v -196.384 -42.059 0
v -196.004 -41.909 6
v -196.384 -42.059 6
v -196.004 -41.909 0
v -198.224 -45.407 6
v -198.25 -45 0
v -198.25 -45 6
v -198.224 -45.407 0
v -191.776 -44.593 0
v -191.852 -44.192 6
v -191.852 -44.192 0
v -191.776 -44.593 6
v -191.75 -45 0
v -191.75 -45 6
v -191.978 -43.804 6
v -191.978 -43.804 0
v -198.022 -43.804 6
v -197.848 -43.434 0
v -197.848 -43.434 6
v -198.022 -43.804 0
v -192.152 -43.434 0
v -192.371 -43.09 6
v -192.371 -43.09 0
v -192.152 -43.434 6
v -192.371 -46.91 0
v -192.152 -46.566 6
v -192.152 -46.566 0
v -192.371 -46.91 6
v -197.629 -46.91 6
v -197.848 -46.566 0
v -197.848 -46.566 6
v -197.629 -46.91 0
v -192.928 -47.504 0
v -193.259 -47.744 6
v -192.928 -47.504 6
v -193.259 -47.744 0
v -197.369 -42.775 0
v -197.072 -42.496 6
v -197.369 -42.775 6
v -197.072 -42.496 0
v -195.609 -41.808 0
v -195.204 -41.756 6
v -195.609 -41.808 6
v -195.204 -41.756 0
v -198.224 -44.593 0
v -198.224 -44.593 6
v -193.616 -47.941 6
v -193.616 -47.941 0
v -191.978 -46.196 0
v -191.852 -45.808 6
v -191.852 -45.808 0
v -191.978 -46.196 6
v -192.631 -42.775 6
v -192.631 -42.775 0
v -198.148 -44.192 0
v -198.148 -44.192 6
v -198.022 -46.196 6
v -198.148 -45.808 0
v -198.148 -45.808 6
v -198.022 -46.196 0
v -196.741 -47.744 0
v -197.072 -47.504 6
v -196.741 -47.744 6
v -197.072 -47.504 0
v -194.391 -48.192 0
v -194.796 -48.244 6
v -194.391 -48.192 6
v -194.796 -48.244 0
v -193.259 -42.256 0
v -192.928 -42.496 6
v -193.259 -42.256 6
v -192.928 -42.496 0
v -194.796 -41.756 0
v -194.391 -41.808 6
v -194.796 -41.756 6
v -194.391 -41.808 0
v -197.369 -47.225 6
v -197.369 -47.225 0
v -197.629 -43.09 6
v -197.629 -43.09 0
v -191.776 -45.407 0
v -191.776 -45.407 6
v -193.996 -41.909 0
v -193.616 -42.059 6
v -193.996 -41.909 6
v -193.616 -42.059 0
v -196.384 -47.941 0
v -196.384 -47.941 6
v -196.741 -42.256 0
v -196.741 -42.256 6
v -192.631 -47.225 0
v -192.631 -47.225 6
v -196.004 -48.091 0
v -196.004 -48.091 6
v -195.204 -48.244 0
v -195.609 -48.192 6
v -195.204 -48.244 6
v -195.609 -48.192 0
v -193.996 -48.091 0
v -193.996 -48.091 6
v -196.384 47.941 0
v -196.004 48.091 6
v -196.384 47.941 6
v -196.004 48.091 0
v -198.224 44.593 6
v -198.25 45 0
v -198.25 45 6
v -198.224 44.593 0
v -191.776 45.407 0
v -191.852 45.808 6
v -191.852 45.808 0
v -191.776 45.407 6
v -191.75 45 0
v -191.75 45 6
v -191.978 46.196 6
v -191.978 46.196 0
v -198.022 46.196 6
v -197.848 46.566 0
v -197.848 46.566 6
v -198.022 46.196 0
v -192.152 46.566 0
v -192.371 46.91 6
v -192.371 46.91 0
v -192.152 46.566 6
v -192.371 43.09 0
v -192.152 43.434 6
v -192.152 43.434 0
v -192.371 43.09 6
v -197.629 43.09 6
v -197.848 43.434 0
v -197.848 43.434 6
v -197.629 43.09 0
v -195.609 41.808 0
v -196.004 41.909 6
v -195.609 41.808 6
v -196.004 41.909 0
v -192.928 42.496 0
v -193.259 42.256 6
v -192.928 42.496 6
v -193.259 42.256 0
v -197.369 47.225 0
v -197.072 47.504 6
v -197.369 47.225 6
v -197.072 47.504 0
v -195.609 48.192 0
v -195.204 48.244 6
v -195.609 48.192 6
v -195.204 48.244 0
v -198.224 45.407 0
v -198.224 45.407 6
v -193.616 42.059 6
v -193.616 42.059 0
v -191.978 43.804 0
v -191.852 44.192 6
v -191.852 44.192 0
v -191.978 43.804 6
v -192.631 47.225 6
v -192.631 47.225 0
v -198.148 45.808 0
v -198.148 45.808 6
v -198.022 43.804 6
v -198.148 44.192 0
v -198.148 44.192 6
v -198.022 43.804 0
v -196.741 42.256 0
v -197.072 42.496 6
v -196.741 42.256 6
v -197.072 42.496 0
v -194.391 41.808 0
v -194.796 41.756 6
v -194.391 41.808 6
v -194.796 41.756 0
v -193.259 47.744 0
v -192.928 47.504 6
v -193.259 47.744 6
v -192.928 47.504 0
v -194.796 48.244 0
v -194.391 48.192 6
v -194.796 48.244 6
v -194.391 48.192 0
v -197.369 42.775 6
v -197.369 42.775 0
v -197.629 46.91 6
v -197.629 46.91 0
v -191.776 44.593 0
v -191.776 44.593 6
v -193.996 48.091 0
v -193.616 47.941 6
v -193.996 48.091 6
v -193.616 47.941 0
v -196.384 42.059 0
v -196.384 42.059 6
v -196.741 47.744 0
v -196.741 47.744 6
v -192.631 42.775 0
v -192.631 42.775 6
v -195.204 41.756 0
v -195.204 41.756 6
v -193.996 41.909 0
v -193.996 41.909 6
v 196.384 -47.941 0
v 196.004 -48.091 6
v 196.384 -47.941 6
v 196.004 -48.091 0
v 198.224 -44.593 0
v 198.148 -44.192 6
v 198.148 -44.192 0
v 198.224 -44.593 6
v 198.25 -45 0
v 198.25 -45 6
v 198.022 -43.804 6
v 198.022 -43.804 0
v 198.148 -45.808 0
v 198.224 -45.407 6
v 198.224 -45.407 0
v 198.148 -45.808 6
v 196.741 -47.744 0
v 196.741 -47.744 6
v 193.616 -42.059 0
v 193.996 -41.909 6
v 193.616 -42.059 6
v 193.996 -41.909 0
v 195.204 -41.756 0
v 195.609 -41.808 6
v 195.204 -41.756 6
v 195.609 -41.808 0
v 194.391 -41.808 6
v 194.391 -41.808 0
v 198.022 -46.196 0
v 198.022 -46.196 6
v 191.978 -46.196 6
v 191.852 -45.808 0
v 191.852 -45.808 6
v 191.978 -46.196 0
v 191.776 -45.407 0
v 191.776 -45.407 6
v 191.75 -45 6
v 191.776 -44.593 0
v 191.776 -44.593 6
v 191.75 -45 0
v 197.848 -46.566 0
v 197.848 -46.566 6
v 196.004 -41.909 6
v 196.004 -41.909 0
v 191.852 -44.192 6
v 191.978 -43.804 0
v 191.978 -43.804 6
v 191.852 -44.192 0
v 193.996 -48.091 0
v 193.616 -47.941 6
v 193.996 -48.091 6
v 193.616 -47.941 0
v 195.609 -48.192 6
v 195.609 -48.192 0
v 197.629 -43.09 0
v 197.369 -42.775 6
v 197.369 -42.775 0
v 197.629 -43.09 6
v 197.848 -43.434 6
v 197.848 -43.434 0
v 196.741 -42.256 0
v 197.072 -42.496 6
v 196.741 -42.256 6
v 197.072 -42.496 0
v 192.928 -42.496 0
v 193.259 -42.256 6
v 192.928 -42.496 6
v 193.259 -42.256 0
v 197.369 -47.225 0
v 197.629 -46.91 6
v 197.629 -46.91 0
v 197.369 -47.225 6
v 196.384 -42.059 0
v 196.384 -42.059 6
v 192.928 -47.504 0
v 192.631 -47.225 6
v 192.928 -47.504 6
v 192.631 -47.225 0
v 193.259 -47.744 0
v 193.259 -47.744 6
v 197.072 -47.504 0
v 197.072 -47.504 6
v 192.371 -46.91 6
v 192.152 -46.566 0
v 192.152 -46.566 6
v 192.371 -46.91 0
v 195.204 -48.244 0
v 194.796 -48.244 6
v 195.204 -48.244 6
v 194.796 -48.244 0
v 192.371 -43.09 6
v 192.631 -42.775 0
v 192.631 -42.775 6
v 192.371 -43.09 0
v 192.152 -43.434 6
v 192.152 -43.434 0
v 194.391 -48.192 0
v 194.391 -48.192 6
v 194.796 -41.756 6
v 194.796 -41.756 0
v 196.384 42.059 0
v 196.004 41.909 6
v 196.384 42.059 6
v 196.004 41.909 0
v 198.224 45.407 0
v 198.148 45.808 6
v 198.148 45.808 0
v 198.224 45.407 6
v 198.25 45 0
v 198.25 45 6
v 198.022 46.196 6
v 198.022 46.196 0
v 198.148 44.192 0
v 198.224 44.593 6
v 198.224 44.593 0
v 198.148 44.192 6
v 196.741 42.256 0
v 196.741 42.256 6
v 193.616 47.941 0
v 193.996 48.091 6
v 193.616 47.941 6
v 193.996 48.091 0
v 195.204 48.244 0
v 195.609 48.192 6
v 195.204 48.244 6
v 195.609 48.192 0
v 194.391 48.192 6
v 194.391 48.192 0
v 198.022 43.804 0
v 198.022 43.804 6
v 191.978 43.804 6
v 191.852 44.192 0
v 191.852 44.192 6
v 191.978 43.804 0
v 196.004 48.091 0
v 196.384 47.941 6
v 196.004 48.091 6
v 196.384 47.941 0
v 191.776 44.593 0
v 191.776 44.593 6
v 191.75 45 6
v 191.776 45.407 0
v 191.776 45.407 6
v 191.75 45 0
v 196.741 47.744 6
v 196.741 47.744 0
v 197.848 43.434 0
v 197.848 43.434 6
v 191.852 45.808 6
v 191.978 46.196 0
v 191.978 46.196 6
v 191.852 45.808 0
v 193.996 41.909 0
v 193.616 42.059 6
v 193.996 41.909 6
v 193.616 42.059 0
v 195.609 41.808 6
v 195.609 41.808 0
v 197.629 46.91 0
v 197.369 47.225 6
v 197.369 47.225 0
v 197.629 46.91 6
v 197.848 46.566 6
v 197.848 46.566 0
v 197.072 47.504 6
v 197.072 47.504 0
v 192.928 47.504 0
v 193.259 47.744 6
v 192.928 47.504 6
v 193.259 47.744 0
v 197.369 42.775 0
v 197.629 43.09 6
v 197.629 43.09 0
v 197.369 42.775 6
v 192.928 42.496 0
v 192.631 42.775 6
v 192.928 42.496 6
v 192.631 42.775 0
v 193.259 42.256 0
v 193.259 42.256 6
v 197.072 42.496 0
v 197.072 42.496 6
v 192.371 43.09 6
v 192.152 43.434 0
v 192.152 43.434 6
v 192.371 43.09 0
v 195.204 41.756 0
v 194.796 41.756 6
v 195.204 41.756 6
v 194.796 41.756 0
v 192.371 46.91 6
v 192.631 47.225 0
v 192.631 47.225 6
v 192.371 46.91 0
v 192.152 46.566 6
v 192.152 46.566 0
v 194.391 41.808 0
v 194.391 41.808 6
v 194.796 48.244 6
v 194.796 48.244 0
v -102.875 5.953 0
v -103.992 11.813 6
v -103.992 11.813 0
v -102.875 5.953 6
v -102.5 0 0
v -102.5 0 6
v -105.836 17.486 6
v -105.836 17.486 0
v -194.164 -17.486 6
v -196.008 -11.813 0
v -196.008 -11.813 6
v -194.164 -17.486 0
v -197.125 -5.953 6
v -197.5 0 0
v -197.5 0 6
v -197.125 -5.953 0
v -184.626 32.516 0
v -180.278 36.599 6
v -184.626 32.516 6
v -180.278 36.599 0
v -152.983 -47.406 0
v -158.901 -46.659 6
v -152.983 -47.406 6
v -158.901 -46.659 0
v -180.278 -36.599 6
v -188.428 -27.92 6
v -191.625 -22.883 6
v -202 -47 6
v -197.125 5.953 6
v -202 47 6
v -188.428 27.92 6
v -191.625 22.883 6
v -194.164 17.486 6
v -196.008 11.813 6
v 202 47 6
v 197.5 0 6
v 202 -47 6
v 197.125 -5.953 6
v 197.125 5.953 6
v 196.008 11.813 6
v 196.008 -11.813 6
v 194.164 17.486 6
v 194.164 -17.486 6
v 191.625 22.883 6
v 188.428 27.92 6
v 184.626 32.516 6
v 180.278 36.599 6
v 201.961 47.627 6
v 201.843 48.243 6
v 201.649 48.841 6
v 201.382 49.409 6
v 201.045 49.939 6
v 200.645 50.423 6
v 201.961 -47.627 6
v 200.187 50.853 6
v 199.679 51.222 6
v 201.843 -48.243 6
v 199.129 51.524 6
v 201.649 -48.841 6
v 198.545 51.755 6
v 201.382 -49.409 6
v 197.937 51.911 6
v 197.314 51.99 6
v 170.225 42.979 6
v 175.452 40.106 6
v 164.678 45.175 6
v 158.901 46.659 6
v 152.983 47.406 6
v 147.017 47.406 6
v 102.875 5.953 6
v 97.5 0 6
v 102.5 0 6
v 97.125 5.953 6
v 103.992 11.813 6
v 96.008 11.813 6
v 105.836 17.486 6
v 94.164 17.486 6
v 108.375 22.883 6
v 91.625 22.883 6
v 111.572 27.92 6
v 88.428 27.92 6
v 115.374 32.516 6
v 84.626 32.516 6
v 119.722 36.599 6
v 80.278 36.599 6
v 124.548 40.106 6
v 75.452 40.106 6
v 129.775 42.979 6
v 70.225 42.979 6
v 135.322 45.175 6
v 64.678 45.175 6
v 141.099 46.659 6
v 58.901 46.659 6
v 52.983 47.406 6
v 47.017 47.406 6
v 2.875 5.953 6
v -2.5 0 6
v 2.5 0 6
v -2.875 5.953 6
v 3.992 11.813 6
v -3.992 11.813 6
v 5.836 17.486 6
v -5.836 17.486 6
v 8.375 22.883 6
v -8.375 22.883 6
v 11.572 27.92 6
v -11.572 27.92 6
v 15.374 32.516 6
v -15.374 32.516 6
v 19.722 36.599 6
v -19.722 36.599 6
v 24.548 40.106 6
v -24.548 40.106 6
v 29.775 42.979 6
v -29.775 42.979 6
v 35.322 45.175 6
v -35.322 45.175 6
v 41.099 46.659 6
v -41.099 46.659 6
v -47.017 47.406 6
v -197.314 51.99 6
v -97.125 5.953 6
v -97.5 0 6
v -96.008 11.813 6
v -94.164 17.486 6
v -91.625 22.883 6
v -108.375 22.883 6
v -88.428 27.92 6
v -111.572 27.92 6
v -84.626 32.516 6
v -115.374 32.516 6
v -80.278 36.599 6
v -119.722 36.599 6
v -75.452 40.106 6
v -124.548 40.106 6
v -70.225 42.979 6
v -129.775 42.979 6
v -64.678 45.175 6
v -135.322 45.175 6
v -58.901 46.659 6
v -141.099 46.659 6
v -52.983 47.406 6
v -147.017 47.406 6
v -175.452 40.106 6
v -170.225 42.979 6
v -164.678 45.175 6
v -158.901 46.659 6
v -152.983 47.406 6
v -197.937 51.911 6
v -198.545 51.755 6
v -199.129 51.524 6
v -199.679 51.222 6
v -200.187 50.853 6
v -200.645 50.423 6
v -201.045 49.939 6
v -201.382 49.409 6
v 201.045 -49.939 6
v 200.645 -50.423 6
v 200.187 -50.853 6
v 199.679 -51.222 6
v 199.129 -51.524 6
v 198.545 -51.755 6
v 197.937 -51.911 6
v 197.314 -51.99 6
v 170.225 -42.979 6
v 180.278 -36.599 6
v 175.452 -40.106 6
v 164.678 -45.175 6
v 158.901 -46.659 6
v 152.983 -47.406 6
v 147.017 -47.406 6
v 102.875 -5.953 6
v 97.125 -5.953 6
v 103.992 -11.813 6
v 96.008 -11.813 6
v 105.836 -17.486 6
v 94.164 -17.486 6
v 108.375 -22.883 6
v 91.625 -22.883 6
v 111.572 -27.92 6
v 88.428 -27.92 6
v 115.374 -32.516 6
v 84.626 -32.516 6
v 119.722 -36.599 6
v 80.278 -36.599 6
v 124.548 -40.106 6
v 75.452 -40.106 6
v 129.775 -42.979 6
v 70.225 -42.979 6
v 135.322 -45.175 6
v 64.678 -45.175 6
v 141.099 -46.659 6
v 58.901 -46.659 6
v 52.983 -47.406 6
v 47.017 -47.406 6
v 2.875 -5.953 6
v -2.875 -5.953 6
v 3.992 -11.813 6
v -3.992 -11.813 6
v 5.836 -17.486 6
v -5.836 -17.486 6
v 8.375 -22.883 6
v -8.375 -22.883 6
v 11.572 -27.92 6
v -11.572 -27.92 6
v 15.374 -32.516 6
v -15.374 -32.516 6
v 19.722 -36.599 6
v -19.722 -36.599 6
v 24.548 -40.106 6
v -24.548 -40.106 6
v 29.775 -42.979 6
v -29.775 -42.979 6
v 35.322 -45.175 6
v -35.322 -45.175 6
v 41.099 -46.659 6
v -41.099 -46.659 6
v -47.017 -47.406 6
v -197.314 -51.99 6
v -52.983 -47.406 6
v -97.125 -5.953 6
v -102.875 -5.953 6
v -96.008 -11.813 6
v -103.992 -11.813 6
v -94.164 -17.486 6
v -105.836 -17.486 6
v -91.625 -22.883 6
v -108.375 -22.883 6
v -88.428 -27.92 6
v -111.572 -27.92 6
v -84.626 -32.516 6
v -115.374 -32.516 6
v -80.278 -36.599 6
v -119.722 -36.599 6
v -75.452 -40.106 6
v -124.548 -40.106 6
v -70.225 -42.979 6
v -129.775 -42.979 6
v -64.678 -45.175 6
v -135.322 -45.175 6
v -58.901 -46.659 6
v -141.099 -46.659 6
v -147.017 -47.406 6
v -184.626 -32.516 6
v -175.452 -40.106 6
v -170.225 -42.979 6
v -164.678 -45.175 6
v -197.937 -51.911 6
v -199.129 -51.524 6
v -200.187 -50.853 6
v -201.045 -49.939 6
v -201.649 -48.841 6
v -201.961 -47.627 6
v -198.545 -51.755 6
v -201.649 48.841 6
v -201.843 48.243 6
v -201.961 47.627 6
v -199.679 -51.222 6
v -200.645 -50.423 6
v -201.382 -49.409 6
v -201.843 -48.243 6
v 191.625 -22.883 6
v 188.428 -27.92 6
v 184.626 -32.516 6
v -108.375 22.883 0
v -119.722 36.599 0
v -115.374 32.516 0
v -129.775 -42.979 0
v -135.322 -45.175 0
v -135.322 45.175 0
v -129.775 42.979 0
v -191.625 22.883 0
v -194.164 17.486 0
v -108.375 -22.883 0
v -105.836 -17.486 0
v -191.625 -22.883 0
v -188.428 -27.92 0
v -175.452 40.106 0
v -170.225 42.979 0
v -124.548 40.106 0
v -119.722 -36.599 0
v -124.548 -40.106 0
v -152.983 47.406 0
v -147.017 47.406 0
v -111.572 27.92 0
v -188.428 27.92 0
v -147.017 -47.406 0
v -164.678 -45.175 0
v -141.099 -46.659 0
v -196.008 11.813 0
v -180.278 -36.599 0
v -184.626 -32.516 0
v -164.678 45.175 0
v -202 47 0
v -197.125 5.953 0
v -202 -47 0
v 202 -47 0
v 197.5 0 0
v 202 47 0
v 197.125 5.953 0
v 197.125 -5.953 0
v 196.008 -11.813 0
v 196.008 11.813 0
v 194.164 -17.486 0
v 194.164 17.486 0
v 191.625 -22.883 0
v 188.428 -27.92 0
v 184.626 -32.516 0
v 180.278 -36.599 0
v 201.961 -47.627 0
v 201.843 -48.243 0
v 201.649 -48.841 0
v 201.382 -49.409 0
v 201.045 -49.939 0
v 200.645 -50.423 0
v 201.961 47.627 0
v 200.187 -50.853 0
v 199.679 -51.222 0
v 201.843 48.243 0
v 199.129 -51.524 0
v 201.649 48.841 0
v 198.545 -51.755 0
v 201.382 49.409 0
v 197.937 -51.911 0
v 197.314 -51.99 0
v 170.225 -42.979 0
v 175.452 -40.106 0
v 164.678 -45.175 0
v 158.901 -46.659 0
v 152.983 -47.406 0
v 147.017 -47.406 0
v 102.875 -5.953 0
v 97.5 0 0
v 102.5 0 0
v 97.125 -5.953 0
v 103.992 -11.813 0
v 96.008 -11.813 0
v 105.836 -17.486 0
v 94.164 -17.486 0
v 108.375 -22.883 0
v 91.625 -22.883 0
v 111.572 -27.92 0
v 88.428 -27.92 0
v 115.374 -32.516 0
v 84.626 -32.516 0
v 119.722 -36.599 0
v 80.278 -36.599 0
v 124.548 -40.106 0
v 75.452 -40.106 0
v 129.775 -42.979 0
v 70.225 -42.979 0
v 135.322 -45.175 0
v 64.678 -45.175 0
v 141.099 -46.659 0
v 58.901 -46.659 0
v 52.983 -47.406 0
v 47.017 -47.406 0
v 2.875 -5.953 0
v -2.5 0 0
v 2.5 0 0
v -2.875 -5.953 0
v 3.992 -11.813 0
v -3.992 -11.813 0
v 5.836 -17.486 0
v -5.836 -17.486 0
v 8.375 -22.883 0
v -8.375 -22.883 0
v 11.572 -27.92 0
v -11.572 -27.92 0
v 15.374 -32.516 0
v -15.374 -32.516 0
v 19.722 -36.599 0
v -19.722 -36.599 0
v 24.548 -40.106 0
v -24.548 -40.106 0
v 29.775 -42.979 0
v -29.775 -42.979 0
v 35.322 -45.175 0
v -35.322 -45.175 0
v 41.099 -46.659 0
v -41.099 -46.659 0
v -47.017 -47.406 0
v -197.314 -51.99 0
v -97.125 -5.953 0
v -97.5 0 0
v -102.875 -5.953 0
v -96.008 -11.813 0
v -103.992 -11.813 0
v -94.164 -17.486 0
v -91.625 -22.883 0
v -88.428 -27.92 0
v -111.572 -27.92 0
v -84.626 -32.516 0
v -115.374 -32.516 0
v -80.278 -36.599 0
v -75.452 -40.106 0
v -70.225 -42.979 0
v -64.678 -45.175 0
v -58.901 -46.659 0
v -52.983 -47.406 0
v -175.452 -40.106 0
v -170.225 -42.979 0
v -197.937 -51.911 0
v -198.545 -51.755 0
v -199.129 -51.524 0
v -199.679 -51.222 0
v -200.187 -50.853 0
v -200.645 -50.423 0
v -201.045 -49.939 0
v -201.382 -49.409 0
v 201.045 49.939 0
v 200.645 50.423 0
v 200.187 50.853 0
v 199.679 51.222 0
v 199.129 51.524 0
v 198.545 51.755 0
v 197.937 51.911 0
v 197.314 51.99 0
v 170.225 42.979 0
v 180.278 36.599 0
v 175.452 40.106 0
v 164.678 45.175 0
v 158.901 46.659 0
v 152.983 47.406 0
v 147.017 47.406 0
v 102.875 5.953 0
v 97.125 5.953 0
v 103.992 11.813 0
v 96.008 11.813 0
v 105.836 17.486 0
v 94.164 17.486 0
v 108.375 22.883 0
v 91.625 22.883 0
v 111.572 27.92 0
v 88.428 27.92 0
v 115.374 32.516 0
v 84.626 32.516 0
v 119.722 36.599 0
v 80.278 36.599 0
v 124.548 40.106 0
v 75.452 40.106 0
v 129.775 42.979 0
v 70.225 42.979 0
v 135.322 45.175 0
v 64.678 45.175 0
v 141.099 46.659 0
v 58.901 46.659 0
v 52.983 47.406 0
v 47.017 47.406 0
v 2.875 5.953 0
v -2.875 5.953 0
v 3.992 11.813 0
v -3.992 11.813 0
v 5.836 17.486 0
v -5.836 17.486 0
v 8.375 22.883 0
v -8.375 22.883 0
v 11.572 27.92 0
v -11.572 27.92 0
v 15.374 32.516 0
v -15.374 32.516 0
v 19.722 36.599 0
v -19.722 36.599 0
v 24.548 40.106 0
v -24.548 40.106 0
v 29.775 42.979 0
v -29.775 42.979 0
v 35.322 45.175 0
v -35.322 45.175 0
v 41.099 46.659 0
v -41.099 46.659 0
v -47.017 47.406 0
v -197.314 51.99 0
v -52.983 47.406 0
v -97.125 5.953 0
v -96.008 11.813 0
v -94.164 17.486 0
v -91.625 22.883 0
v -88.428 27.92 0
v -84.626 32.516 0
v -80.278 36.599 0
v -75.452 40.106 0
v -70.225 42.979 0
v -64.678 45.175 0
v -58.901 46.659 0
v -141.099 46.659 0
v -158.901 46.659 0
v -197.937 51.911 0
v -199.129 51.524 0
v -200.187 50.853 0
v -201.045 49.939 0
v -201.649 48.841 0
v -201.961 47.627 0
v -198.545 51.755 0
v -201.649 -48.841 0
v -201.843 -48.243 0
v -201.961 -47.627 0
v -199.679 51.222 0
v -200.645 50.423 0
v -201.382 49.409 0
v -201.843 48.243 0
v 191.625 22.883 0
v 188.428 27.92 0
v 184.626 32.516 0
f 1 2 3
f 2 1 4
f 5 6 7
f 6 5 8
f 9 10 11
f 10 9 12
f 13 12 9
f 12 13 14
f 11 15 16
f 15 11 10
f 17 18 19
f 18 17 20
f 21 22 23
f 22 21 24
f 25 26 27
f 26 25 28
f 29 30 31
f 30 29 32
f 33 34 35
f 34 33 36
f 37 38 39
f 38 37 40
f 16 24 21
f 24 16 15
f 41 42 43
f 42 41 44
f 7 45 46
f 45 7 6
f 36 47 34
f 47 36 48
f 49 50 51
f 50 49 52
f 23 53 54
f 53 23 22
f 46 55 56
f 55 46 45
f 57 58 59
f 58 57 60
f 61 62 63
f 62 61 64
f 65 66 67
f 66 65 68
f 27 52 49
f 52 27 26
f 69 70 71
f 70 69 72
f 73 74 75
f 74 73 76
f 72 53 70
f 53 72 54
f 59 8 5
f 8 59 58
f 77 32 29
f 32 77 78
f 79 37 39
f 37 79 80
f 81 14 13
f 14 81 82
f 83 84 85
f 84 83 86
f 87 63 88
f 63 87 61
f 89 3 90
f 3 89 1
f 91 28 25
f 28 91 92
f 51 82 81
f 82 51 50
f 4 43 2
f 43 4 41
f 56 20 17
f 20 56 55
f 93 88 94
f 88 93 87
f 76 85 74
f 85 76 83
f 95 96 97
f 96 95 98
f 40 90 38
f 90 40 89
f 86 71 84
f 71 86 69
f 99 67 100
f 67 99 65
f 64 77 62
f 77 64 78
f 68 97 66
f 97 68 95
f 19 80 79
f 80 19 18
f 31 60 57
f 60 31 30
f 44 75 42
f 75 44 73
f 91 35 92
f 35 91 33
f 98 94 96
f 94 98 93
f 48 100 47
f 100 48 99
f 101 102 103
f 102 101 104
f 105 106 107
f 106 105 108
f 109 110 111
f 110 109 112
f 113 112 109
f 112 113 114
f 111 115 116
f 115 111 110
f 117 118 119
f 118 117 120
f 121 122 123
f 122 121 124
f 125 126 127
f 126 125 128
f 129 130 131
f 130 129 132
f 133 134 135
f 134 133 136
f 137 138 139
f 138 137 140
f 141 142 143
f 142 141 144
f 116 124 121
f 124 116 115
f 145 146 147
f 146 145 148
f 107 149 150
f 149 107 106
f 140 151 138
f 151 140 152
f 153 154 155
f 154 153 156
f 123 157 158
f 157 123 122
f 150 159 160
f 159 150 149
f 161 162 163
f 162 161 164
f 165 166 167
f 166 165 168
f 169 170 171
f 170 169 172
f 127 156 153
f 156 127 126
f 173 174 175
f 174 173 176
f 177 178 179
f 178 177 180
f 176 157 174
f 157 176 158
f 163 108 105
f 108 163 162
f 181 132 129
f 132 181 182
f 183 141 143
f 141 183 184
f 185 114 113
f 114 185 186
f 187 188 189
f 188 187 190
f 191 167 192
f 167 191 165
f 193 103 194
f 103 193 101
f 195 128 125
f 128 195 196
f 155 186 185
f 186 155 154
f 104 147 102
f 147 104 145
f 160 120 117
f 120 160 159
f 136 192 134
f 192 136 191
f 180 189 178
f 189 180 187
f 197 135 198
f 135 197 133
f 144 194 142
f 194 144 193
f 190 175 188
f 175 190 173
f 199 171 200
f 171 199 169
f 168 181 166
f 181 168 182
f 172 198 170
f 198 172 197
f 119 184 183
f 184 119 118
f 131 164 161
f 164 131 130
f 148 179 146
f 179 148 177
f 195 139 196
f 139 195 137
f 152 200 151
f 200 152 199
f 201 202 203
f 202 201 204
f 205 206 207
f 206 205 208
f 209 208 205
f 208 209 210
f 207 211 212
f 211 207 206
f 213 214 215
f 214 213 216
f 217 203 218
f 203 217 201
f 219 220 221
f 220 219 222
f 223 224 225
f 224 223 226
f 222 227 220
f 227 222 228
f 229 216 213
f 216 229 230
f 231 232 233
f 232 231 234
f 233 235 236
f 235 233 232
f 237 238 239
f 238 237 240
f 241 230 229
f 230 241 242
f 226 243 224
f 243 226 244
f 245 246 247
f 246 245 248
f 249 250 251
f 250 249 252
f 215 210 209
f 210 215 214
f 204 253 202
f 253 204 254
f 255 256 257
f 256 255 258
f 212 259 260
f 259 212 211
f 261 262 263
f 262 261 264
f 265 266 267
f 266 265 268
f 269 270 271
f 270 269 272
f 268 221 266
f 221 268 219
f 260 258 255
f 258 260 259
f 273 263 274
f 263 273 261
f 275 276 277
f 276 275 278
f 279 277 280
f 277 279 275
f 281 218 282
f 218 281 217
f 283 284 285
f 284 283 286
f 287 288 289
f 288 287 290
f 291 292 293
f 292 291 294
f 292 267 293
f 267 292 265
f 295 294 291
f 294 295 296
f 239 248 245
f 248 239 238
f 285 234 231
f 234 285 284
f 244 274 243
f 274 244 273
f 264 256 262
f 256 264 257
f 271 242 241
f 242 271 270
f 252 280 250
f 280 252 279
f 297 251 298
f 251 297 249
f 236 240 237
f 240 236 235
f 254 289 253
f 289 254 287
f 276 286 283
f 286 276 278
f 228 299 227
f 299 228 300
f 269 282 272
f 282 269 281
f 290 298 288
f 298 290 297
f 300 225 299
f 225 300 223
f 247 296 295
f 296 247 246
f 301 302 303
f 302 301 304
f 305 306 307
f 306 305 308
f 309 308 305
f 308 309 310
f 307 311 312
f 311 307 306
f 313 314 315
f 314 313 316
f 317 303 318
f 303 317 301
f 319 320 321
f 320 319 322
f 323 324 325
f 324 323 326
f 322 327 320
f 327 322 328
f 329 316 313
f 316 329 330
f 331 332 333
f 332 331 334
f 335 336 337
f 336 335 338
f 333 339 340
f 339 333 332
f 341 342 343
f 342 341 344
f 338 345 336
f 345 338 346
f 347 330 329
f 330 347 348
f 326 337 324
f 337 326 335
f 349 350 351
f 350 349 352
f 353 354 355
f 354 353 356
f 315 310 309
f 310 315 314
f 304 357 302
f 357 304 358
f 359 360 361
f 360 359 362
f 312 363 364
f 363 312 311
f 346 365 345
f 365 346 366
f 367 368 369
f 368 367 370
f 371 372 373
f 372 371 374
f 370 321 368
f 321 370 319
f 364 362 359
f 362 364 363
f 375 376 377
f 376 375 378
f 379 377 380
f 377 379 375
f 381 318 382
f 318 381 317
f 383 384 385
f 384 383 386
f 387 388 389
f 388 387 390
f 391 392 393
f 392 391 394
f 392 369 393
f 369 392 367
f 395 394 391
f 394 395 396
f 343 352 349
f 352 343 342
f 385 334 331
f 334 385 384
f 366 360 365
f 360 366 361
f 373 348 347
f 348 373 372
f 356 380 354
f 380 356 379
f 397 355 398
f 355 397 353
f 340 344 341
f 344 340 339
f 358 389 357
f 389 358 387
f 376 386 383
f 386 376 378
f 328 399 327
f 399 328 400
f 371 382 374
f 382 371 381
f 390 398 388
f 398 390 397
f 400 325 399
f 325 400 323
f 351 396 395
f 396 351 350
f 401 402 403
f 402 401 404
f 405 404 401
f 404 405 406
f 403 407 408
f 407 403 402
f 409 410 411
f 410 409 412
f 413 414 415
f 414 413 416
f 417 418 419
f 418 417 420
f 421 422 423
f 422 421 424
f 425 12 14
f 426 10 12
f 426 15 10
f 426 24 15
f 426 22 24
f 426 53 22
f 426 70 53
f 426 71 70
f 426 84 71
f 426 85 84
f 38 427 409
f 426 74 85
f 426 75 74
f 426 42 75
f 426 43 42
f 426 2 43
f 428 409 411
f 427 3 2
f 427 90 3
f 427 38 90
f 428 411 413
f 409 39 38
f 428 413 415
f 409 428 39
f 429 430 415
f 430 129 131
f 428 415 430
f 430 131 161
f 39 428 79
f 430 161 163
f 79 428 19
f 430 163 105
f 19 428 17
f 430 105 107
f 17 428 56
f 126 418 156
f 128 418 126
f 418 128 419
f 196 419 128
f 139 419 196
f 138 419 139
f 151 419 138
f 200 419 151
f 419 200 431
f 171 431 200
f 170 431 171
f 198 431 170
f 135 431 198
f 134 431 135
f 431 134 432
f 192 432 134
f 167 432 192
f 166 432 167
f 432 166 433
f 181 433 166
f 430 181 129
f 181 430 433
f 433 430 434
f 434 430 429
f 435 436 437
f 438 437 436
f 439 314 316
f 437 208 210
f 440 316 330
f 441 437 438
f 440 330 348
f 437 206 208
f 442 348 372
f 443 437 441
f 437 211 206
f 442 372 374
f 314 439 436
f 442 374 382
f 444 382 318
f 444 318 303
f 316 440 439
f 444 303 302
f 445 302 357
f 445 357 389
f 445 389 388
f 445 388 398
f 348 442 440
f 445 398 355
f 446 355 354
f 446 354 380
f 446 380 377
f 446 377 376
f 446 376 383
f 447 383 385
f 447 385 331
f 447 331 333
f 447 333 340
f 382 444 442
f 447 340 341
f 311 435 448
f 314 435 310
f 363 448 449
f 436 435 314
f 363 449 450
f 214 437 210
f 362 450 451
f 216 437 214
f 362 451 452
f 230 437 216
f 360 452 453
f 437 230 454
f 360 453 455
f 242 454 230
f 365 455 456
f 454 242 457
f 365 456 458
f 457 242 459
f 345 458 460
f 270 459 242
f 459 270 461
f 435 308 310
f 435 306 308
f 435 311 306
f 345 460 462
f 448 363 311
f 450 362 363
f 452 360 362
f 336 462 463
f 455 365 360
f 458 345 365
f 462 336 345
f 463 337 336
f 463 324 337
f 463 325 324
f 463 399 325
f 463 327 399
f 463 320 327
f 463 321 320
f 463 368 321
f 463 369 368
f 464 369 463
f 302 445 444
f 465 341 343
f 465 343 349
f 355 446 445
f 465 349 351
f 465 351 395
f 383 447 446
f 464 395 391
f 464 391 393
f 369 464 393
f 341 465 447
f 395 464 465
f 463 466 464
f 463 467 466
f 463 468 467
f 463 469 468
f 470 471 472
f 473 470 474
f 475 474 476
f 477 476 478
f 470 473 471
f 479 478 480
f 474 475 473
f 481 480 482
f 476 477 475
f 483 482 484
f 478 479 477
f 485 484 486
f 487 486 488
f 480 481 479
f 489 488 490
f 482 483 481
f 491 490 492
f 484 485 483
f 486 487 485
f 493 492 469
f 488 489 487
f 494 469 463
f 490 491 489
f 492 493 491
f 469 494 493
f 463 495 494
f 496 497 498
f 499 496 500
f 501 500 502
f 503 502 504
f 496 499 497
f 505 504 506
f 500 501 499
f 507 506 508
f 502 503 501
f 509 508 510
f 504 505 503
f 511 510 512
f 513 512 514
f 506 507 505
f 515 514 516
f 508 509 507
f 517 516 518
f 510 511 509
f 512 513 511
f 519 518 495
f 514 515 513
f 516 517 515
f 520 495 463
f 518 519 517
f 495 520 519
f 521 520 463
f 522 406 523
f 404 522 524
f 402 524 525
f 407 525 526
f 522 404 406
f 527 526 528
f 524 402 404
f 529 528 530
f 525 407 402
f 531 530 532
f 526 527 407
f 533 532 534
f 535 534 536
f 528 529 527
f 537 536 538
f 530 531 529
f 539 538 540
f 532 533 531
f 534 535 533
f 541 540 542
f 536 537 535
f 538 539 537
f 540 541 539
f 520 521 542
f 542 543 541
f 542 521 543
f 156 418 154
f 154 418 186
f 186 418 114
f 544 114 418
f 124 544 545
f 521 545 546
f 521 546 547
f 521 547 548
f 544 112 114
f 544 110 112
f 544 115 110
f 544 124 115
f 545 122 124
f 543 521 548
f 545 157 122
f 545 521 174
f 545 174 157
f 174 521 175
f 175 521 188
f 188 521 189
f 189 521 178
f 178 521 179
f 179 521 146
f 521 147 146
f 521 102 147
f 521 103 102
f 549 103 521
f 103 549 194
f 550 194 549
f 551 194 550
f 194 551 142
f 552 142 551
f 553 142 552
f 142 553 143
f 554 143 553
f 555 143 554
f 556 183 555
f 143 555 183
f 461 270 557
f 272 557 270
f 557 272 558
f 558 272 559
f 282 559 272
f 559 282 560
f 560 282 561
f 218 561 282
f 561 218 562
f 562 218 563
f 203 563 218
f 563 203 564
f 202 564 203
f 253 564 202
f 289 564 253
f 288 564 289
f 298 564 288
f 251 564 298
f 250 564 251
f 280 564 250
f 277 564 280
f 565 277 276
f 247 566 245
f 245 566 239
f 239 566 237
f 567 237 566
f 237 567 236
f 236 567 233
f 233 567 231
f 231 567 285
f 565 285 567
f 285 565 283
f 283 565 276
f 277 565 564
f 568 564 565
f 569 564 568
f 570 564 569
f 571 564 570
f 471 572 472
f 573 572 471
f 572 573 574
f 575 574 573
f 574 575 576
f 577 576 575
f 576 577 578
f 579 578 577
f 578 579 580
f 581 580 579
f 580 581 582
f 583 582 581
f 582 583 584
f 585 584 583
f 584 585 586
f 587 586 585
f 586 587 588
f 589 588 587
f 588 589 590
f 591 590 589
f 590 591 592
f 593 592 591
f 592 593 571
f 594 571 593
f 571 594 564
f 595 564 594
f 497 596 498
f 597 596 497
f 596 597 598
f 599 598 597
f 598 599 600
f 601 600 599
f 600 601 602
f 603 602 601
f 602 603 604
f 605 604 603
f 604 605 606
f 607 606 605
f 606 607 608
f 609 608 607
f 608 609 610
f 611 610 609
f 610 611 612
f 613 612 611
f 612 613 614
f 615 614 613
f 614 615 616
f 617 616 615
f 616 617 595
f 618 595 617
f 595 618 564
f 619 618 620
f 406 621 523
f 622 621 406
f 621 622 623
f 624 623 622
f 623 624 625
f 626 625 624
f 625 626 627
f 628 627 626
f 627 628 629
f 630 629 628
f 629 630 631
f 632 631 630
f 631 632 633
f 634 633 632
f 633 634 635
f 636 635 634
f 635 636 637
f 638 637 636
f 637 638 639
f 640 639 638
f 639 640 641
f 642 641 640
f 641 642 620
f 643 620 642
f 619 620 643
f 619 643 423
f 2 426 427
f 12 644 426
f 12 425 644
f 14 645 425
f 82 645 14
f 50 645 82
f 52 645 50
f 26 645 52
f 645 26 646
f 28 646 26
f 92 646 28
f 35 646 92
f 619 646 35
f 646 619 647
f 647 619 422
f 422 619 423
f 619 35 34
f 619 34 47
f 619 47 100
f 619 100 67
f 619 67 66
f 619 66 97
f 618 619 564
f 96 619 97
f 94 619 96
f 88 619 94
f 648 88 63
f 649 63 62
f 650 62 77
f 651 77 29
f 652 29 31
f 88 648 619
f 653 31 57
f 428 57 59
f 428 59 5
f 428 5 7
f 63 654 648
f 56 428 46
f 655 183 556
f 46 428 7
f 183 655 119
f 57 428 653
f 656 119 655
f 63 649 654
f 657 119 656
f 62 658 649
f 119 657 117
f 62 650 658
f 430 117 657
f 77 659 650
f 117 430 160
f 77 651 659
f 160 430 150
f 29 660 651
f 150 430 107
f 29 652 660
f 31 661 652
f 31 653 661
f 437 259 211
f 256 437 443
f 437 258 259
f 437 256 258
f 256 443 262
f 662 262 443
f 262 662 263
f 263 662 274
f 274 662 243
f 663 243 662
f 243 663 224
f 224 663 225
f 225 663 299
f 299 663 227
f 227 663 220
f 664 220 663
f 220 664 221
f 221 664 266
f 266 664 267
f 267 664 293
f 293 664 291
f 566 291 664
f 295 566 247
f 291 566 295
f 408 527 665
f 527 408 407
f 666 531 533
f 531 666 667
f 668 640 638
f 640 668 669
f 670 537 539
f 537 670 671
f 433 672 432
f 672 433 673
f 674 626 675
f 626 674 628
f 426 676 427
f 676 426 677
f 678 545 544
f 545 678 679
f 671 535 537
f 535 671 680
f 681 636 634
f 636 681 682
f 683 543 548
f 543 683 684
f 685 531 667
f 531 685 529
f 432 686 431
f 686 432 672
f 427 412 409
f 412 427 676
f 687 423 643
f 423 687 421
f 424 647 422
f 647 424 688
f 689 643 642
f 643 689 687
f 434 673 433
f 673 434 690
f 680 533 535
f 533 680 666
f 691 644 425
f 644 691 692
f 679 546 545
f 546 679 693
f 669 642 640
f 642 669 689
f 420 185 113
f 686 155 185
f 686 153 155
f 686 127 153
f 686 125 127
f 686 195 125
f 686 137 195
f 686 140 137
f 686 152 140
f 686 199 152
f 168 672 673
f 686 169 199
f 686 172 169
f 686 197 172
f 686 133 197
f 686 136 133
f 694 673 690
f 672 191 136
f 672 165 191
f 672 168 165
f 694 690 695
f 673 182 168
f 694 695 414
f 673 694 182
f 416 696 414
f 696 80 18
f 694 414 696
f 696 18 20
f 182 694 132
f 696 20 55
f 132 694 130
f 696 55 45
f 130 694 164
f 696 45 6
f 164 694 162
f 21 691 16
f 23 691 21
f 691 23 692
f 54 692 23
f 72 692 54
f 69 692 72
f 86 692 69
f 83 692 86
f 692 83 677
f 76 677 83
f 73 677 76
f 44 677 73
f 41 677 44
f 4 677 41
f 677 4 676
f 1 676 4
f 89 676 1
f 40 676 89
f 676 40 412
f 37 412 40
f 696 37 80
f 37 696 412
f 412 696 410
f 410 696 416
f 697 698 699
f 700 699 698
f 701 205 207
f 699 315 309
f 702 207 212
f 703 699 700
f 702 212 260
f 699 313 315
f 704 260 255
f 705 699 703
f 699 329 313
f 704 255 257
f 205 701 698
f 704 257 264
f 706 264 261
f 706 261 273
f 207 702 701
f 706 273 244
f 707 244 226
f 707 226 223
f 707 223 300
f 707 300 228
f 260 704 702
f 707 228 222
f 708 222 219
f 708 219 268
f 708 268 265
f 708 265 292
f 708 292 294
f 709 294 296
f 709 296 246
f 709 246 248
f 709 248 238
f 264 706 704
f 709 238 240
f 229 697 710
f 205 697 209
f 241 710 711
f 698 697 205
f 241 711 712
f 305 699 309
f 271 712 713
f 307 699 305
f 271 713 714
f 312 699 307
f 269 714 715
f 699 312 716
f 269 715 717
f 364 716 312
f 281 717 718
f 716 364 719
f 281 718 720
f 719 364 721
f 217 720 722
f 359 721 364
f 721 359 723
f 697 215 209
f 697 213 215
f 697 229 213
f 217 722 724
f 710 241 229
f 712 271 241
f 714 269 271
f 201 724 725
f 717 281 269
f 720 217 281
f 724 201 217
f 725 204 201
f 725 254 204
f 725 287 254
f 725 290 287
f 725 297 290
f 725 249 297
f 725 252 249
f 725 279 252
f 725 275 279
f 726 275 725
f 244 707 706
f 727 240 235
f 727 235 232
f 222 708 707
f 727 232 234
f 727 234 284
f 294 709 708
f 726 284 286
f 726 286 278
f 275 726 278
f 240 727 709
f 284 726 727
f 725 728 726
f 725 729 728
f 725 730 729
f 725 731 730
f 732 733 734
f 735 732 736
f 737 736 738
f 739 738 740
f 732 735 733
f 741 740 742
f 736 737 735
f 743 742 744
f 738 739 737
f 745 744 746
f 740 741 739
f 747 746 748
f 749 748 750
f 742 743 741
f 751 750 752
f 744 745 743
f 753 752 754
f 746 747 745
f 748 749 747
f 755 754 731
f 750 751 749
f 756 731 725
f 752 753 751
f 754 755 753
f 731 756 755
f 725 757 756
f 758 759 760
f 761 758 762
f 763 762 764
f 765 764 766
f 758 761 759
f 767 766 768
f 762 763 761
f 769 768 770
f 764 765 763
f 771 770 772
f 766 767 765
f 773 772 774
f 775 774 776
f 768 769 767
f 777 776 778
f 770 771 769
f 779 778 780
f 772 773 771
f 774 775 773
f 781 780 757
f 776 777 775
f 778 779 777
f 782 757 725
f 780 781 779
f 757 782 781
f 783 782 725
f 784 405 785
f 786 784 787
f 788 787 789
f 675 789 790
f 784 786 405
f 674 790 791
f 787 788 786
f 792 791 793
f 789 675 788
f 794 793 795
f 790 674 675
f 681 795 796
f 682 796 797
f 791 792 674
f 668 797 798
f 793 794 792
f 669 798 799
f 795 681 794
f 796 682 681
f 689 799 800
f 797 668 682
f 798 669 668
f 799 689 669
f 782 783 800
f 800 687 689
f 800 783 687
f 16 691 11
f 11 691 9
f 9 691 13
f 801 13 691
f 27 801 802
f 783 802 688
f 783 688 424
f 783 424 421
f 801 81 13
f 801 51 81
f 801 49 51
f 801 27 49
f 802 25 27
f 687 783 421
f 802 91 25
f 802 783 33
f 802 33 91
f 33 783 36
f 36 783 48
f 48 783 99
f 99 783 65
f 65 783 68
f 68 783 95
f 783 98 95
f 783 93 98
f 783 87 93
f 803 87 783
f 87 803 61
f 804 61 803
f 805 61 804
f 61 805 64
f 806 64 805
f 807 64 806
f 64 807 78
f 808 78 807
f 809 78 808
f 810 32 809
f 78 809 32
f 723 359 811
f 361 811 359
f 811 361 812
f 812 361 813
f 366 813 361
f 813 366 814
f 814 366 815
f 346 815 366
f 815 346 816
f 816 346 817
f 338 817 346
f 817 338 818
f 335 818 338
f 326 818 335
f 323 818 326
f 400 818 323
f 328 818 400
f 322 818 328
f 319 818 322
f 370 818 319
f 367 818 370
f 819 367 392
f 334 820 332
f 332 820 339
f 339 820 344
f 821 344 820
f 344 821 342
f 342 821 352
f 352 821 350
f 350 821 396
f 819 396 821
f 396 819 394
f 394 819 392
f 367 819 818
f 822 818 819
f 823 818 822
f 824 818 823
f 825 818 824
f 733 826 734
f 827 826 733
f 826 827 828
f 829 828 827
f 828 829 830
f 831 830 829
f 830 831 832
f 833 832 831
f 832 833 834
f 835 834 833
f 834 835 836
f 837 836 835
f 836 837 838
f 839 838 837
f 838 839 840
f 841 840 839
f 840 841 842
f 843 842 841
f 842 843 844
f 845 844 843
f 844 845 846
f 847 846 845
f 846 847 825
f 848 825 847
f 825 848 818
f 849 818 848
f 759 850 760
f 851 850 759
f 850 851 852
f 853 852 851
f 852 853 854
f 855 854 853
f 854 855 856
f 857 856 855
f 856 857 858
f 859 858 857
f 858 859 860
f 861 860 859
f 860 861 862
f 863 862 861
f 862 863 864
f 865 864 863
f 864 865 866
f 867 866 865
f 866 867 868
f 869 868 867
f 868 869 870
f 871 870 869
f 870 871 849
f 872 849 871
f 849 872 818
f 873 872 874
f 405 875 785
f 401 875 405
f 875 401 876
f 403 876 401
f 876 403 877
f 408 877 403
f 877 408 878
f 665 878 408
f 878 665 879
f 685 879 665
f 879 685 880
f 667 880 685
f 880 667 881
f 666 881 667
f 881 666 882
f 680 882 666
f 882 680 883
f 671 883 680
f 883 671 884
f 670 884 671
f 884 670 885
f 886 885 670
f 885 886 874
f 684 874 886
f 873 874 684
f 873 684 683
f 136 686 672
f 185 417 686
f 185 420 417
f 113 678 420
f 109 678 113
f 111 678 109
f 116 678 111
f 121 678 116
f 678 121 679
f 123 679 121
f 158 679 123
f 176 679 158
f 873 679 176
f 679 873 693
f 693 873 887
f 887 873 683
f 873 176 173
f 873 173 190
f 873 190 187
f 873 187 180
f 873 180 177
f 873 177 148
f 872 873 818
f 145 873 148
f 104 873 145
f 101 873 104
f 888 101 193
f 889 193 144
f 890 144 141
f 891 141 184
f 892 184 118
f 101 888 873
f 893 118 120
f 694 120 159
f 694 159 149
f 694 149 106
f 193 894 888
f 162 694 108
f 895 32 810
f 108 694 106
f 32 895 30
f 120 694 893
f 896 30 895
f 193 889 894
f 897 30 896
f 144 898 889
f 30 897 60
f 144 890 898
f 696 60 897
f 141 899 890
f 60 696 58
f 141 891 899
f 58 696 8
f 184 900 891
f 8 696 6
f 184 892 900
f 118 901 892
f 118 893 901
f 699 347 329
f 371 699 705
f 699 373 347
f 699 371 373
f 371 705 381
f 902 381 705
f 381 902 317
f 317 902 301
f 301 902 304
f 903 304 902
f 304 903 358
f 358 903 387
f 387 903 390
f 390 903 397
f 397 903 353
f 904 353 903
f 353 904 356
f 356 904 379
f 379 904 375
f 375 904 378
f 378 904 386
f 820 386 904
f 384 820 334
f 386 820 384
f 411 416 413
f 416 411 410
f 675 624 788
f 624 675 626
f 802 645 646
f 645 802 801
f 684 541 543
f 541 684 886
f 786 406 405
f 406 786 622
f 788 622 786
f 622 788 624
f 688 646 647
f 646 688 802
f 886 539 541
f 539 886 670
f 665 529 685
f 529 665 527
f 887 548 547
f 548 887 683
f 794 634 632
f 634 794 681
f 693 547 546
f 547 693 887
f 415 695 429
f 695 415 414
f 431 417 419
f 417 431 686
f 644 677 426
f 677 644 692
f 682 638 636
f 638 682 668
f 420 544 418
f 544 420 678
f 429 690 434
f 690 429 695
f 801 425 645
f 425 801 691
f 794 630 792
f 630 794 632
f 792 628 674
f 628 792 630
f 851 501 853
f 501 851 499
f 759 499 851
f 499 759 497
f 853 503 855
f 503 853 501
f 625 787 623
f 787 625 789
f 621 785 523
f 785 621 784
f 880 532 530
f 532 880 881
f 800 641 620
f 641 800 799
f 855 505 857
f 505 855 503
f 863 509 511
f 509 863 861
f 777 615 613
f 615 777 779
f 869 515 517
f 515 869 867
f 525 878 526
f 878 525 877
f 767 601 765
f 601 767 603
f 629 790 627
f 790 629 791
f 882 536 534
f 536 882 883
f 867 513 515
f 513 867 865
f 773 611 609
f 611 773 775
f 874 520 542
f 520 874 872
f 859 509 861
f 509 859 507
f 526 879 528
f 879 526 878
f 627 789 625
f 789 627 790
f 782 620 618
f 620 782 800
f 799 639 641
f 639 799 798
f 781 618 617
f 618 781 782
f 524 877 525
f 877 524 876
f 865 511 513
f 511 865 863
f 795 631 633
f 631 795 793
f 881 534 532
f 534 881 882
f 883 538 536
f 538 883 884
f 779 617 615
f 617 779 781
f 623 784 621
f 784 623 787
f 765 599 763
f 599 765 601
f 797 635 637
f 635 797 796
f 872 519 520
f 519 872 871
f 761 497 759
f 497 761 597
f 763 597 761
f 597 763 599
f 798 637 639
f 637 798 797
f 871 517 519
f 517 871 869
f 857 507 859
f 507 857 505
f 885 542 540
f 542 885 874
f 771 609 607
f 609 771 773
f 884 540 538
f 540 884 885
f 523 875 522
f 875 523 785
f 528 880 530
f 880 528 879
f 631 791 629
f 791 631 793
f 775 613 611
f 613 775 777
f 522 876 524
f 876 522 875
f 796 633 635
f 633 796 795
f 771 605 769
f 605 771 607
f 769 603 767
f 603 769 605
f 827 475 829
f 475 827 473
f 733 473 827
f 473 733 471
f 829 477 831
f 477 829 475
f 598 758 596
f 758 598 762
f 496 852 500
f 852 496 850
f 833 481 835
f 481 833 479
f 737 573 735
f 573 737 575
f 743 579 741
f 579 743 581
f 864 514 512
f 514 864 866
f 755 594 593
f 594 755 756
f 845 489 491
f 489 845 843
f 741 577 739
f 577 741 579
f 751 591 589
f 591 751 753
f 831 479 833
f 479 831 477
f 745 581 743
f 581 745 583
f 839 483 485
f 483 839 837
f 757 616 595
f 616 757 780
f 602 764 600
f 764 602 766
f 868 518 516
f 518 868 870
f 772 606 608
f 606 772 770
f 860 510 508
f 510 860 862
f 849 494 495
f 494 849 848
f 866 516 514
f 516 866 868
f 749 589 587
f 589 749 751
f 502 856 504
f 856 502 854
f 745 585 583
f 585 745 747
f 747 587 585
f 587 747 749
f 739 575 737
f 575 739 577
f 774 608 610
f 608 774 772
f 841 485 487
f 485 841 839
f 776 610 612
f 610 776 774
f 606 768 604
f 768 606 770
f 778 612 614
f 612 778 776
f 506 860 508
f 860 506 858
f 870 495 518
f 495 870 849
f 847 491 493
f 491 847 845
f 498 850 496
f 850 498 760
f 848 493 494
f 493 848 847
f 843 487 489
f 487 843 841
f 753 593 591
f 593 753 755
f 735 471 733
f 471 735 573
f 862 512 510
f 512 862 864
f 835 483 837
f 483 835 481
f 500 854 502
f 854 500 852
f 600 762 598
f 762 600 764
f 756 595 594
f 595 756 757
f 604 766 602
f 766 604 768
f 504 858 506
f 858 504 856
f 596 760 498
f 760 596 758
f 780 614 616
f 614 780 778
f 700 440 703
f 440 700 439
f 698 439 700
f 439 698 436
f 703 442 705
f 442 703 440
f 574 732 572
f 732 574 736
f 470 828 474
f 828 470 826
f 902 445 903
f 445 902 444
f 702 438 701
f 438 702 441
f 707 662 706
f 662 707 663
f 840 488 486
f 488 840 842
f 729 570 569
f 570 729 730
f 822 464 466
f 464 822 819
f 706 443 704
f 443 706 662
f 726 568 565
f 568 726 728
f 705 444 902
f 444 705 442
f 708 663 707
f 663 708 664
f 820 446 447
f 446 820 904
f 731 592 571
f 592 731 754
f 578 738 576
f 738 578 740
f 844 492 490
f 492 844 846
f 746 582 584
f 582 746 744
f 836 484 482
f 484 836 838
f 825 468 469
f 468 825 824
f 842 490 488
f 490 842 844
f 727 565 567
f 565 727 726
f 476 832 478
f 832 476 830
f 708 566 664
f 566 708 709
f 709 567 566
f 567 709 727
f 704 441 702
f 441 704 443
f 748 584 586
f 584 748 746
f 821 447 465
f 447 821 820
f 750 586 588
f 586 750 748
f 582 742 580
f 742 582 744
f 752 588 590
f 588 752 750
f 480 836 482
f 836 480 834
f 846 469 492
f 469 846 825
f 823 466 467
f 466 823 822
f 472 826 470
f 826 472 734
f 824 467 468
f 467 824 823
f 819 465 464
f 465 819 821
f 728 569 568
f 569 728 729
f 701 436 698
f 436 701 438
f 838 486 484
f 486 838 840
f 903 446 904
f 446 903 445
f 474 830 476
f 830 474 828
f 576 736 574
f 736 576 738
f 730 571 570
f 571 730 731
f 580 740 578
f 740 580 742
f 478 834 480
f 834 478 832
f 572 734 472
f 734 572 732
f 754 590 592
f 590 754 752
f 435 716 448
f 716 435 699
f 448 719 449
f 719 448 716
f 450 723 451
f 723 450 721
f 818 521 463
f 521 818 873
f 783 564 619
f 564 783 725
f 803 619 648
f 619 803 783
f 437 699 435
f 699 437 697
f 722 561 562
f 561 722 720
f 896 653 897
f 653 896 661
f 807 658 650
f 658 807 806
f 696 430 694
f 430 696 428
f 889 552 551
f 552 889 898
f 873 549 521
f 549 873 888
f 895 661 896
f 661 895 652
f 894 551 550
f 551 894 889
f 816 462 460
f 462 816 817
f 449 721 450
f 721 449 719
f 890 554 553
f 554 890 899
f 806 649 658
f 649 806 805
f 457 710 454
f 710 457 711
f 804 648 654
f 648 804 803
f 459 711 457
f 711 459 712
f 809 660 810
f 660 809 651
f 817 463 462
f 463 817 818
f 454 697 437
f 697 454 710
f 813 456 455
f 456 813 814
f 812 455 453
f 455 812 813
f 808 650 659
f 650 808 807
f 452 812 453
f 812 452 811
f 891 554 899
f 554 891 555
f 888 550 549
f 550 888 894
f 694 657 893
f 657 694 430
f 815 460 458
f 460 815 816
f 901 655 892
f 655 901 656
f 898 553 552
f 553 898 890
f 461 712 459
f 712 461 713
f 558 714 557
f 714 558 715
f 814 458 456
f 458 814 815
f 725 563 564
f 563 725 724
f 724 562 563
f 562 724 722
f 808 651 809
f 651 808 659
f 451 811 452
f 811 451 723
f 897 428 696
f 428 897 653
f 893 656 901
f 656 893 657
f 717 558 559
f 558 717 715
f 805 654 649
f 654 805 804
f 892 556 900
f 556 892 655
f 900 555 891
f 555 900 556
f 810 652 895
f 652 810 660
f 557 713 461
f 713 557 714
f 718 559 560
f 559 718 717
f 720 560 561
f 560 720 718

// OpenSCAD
$fn = 50;


difference() {
	union() {
		hull() {
			translate(v = [-197.0000000000, 47.0000000000, 0]) {
				cylinder(h = 6, r = 5);
			}
			translate(v = [197.0000000000, 47.0000000000, 0]) {
				cylinder(h = 6, r = 5);
			}
			translate(v = [-197.0000000000, -47.0000000000, 0]) {
				cylinder(h = 6, r = 5);
			}
			translate(v = [197.0000000000, -47.0000000000, 0]) {
				cylinder(h = 6, r = 5);
			}
		}
	}
	union() {
		#translate(v = [-195.0000000000, -45.0000000000, -100.0000000000]) {
			cylinder(h = 200, r = 3.2500000000);
		}
		#translate(v = [-195.0000000000, 45.0000000000, -100.0000000000]) {
			cylinder(h = 200, r = 3.2500000000);
		}
		#translate(v = [195.0000000000, -45.0000000000, -100.0000000000]) {
			cylinder(h = 200, r = 3.2500000000);
		}
		#translate(v = [195.0000000000, 45.0000000000, -100.0000000000]) {
			cylinder(h = 200, r = 3.2500000000);
		}
		#translate(v = [-150.0000000000, 0, 0]) {
			cylinder(h = 6, r = 47.5000000000);
		}
		#translate(v = [-50.0000000000, 0, 0]) {
			cylinder(h = 6, r = 47.5000000000);
		}
		#translate(v = [50.0000000000, 0, 0]) {
			cylinder(h = 6, r = 47.5000000000);
		}
		#translate(v = [150.0000000000, 0, 0]) {
			cylinder(h = 6, r = 47.5000000000);
		}
	}
}
